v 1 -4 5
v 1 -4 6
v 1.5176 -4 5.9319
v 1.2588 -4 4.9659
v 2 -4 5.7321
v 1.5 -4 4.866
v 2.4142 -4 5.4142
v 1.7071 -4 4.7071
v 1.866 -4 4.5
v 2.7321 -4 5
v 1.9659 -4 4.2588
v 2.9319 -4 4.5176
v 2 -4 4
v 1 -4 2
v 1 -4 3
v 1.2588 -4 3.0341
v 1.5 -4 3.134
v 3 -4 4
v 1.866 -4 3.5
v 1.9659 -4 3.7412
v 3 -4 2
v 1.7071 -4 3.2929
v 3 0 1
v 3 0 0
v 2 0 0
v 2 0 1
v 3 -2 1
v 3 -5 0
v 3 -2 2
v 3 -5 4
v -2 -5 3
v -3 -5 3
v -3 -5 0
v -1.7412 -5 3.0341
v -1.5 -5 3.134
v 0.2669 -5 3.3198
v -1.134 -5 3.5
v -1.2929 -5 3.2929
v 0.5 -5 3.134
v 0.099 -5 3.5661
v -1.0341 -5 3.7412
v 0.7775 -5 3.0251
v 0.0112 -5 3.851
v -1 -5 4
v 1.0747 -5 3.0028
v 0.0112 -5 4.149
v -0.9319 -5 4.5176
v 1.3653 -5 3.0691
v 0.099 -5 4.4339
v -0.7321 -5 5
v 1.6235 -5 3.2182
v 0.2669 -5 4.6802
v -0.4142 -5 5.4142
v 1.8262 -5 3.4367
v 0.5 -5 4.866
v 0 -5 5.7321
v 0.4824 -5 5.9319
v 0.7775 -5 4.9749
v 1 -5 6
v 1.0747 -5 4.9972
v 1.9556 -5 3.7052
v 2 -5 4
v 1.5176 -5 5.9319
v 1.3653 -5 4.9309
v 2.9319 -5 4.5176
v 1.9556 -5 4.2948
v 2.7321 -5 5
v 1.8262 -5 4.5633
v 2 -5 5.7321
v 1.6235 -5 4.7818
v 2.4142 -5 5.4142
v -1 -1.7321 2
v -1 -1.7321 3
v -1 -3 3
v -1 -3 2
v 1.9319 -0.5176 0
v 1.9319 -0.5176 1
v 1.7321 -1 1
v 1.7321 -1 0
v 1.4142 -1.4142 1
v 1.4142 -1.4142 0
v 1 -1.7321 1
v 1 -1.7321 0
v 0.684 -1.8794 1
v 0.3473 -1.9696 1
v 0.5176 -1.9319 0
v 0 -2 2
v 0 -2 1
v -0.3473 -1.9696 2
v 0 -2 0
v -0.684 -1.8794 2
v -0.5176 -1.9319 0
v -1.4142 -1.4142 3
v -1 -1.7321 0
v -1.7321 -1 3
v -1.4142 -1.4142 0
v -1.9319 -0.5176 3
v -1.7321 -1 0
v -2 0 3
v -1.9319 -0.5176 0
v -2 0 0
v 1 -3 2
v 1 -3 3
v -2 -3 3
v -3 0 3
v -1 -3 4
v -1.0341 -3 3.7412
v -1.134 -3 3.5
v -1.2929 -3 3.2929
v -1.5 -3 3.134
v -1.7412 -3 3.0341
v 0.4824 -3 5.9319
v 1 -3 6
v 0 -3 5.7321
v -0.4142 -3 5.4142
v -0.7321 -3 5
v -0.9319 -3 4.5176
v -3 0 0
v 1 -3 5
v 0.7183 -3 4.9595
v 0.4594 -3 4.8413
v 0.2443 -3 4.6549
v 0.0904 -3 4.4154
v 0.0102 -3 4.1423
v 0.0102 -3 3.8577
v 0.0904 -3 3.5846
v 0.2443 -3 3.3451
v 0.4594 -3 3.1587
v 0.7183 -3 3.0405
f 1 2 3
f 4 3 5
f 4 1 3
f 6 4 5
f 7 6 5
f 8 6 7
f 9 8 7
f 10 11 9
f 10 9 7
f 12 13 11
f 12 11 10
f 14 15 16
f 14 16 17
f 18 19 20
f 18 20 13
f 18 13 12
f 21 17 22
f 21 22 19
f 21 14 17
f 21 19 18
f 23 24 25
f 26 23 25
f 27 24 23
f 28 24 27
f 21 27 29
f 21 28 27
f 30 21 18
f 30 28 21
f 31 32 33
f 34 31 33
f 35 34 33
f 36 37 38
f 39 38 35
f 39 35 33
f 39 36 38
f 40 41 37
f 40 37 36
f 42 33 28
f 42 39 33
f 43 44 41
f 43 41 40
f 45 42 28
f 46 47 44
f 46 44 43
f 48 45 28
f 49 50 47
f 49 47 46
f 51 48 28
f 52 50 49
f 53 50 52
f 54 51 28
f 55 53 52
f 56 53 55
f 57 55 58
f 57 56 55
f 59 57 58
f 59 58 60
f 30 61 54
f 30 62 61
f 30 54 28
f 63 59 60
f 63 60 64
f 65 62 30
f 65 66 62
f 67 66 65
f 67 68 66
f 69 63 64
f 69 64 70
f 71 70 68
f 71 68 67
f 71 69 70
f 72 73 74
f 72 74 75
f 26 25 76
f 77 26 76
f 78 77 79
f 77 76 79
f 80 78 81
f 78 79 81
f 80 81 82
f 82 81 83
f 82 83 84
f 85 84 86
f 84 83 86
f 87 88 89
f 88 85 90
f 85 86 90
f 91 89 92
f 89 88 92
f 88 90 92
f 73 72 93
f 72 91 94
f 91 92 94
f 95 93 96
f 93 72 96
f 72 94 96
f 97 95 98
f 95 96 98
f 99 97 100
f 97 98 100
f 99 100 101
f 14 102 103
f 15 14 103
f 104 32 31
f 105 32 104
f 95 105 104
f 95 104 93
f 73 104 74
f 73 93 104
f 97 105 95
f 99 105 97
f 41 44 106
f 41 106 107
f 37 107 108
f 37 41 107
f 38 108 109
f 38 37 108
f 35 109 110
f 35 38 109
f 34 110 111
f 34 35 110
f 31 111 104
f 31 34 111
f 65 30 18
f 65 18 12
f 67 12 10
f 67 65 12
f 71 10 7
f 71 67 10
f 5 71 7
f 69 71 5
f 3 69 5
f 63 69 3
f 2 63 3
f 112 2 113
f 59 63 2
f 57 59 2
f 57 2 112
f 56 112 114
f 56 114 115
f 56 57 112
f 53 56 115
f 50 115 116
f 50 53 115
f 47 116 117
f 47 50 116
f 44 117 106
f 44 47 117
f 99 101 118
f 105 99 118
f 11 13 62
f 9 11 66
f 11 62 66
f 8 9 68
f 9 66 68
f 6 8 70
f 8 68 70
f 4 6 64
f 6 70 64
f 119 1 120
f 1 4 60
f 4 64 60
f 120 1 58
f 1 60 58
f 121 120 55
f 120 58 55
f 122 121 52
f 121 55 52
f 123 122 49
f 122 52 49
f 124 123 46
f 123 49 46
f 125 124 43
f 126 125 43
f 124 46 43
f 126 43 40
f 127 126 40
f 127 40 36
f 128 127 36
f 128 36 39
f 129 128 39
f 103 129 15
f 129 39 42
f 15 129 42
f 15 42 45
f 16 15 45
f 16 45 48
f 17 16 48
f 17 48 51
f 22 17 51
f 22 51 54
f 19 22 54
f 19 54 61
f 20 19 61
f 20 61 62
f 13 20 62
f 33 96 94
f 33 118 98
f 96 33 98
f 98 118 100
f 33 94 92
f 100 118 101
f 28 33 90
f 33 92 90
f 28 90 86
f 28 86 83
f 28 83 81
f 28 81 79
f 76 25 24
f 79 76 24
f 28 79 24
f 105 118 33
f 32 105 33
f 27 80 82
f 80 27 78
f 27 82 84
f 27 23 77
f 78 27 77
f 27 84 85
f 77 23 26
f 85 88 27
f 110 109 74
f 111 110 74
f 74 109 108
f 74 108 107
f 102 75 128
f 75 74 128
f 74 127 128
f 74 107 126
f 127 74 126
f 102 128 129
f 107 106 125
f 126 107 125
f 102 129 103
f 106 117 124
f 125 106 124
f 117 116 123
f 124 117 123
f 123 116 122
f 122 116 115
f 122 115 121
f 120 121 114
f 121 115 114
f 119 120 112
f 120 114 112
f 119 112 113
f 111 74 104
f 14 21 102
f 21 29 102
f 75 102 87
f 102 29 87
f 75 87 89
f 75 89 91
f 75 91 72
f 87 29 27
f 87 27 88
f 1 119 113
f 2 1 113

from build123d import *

# Parameters (mm, degrees)
BOSS_EXTRUDE1_DEPTH = 3
SKETCH2_W           = 2
SKETCH2_H           = 2
CUT_EXTRUDE14_DEPTH = 2
SKETCH6_W           = 1
SKETCH6_H           = 3.267949192
CUT_EXTRUDE16_DEPTH = 4
CUT_EXTRUDE17_DEPTH = 1
SKETCH9_R           = 1
BOSS_EXTRUDE2_DEPTH = 2
CUT_EXTRUDE18_DEPTH = 1


with BuildPart() as part:
    # Sketch1 → Boss-Extrude1 (new body)
    with BuildSketch(Plane.XY):
        with BuildLine():
            Line((-2, 0), (-3, 0))
            Line((-3, 0), (-3, -5))
            Line((-3, -5), (3, -5))
            Line((3, -5), (3, 0))
            Line((3, 0), (2, 0))
            ThreePointArc((2, 0), (0, -2), (-2, 0))
        make_face()
    extrude(amount=BOSS_EXTRUDE1_DEPTH)

    # Sketch2 → Cut-Extrude14 (cut)
    with BuildSketch(Plane(origin=(0, 0, 0), x_dir=(1, 0, 0), z_dir=(0, 1, 0))):
        with Locations((2, -2)):
            Rectangle(SKETCH2_W, SKETCH2_H)
    extrude(amount=-CUT_EXTRUDE14_DEPTH, mode=Mode.SUBTRACT)

    # Sketch6 → Cut-Extrude16 (cut)
    with BuildSketch(Plane(origin=(3, 0, 0), x_dir=(0, 0, -1), z_dir=(1, 0, 0))):
        with Locations((-2.5, -3.366025404)):
            Rectangle(SKETCH6_W, SKETCH6_H)
    extrude(amount=-CUT_EXTRUDE16_DEPTH, mode=Mode.SUBTRACT)

    # Sketch8 → Cut-Extrude17 (cut)
    with BuildSketch(Plane.XY.offset(2)):
        with BuildLine():
            Line((1, -2), (0, -2))
            ThreePointArc((0, -2), (0.51763809, -1.931851653), (1, -1.732050808))
            Line((1, -1.732050808), (1, -2))
        make_face()
    extrude(amount=-CUT_EXTRUDE17_DEPTH, mode=Mode.SUBTRACT)

    # Sketch9 → Boss-Extrude2 (add)
    with BuildSketch(Plane.XZ.offset(5)):
        with BuildLine():
            Line((3, 2), (3, 4))
            ThreePointArc((3, 4), (1, 6), (-1, 4))
            ThreePointArc((-1, 4), (-1.292893219, 3.292893219), (-2, 3))
            Line((-2, 3), (-1, 3))
            Line((-1, 3), (-1, 2))
            Line((-1, 2), (3, 2))
        make_face()
        with Locations((1, 4)):
            Circle(SKETCH9_R, mode=Mode.SUBTRACT)
    extrude(amount=-BOSS_EXTRUDE2_DEPTH)

    # Sketch10 → Cut-Extrude18 (cut)
    with BuildSketch(Plane(origin=(0, -3, 0), x_dir=(1, 0, 0), z_dir=(0, 1, 0))):
        with BuildLine():
            Line((1, -2), (1, -6))
            ThreePointArc((1, -6), (2.414213562, -5.414213562), (3, -4))
            Line((3, -4), (3, -2))
            Line((3, -2), (1, -2))
        make_face()
    extrude(amount=-CUT_EXTRUDE18_DEPTH, mode=Mode.SUBTRACT)


solid = part.part
